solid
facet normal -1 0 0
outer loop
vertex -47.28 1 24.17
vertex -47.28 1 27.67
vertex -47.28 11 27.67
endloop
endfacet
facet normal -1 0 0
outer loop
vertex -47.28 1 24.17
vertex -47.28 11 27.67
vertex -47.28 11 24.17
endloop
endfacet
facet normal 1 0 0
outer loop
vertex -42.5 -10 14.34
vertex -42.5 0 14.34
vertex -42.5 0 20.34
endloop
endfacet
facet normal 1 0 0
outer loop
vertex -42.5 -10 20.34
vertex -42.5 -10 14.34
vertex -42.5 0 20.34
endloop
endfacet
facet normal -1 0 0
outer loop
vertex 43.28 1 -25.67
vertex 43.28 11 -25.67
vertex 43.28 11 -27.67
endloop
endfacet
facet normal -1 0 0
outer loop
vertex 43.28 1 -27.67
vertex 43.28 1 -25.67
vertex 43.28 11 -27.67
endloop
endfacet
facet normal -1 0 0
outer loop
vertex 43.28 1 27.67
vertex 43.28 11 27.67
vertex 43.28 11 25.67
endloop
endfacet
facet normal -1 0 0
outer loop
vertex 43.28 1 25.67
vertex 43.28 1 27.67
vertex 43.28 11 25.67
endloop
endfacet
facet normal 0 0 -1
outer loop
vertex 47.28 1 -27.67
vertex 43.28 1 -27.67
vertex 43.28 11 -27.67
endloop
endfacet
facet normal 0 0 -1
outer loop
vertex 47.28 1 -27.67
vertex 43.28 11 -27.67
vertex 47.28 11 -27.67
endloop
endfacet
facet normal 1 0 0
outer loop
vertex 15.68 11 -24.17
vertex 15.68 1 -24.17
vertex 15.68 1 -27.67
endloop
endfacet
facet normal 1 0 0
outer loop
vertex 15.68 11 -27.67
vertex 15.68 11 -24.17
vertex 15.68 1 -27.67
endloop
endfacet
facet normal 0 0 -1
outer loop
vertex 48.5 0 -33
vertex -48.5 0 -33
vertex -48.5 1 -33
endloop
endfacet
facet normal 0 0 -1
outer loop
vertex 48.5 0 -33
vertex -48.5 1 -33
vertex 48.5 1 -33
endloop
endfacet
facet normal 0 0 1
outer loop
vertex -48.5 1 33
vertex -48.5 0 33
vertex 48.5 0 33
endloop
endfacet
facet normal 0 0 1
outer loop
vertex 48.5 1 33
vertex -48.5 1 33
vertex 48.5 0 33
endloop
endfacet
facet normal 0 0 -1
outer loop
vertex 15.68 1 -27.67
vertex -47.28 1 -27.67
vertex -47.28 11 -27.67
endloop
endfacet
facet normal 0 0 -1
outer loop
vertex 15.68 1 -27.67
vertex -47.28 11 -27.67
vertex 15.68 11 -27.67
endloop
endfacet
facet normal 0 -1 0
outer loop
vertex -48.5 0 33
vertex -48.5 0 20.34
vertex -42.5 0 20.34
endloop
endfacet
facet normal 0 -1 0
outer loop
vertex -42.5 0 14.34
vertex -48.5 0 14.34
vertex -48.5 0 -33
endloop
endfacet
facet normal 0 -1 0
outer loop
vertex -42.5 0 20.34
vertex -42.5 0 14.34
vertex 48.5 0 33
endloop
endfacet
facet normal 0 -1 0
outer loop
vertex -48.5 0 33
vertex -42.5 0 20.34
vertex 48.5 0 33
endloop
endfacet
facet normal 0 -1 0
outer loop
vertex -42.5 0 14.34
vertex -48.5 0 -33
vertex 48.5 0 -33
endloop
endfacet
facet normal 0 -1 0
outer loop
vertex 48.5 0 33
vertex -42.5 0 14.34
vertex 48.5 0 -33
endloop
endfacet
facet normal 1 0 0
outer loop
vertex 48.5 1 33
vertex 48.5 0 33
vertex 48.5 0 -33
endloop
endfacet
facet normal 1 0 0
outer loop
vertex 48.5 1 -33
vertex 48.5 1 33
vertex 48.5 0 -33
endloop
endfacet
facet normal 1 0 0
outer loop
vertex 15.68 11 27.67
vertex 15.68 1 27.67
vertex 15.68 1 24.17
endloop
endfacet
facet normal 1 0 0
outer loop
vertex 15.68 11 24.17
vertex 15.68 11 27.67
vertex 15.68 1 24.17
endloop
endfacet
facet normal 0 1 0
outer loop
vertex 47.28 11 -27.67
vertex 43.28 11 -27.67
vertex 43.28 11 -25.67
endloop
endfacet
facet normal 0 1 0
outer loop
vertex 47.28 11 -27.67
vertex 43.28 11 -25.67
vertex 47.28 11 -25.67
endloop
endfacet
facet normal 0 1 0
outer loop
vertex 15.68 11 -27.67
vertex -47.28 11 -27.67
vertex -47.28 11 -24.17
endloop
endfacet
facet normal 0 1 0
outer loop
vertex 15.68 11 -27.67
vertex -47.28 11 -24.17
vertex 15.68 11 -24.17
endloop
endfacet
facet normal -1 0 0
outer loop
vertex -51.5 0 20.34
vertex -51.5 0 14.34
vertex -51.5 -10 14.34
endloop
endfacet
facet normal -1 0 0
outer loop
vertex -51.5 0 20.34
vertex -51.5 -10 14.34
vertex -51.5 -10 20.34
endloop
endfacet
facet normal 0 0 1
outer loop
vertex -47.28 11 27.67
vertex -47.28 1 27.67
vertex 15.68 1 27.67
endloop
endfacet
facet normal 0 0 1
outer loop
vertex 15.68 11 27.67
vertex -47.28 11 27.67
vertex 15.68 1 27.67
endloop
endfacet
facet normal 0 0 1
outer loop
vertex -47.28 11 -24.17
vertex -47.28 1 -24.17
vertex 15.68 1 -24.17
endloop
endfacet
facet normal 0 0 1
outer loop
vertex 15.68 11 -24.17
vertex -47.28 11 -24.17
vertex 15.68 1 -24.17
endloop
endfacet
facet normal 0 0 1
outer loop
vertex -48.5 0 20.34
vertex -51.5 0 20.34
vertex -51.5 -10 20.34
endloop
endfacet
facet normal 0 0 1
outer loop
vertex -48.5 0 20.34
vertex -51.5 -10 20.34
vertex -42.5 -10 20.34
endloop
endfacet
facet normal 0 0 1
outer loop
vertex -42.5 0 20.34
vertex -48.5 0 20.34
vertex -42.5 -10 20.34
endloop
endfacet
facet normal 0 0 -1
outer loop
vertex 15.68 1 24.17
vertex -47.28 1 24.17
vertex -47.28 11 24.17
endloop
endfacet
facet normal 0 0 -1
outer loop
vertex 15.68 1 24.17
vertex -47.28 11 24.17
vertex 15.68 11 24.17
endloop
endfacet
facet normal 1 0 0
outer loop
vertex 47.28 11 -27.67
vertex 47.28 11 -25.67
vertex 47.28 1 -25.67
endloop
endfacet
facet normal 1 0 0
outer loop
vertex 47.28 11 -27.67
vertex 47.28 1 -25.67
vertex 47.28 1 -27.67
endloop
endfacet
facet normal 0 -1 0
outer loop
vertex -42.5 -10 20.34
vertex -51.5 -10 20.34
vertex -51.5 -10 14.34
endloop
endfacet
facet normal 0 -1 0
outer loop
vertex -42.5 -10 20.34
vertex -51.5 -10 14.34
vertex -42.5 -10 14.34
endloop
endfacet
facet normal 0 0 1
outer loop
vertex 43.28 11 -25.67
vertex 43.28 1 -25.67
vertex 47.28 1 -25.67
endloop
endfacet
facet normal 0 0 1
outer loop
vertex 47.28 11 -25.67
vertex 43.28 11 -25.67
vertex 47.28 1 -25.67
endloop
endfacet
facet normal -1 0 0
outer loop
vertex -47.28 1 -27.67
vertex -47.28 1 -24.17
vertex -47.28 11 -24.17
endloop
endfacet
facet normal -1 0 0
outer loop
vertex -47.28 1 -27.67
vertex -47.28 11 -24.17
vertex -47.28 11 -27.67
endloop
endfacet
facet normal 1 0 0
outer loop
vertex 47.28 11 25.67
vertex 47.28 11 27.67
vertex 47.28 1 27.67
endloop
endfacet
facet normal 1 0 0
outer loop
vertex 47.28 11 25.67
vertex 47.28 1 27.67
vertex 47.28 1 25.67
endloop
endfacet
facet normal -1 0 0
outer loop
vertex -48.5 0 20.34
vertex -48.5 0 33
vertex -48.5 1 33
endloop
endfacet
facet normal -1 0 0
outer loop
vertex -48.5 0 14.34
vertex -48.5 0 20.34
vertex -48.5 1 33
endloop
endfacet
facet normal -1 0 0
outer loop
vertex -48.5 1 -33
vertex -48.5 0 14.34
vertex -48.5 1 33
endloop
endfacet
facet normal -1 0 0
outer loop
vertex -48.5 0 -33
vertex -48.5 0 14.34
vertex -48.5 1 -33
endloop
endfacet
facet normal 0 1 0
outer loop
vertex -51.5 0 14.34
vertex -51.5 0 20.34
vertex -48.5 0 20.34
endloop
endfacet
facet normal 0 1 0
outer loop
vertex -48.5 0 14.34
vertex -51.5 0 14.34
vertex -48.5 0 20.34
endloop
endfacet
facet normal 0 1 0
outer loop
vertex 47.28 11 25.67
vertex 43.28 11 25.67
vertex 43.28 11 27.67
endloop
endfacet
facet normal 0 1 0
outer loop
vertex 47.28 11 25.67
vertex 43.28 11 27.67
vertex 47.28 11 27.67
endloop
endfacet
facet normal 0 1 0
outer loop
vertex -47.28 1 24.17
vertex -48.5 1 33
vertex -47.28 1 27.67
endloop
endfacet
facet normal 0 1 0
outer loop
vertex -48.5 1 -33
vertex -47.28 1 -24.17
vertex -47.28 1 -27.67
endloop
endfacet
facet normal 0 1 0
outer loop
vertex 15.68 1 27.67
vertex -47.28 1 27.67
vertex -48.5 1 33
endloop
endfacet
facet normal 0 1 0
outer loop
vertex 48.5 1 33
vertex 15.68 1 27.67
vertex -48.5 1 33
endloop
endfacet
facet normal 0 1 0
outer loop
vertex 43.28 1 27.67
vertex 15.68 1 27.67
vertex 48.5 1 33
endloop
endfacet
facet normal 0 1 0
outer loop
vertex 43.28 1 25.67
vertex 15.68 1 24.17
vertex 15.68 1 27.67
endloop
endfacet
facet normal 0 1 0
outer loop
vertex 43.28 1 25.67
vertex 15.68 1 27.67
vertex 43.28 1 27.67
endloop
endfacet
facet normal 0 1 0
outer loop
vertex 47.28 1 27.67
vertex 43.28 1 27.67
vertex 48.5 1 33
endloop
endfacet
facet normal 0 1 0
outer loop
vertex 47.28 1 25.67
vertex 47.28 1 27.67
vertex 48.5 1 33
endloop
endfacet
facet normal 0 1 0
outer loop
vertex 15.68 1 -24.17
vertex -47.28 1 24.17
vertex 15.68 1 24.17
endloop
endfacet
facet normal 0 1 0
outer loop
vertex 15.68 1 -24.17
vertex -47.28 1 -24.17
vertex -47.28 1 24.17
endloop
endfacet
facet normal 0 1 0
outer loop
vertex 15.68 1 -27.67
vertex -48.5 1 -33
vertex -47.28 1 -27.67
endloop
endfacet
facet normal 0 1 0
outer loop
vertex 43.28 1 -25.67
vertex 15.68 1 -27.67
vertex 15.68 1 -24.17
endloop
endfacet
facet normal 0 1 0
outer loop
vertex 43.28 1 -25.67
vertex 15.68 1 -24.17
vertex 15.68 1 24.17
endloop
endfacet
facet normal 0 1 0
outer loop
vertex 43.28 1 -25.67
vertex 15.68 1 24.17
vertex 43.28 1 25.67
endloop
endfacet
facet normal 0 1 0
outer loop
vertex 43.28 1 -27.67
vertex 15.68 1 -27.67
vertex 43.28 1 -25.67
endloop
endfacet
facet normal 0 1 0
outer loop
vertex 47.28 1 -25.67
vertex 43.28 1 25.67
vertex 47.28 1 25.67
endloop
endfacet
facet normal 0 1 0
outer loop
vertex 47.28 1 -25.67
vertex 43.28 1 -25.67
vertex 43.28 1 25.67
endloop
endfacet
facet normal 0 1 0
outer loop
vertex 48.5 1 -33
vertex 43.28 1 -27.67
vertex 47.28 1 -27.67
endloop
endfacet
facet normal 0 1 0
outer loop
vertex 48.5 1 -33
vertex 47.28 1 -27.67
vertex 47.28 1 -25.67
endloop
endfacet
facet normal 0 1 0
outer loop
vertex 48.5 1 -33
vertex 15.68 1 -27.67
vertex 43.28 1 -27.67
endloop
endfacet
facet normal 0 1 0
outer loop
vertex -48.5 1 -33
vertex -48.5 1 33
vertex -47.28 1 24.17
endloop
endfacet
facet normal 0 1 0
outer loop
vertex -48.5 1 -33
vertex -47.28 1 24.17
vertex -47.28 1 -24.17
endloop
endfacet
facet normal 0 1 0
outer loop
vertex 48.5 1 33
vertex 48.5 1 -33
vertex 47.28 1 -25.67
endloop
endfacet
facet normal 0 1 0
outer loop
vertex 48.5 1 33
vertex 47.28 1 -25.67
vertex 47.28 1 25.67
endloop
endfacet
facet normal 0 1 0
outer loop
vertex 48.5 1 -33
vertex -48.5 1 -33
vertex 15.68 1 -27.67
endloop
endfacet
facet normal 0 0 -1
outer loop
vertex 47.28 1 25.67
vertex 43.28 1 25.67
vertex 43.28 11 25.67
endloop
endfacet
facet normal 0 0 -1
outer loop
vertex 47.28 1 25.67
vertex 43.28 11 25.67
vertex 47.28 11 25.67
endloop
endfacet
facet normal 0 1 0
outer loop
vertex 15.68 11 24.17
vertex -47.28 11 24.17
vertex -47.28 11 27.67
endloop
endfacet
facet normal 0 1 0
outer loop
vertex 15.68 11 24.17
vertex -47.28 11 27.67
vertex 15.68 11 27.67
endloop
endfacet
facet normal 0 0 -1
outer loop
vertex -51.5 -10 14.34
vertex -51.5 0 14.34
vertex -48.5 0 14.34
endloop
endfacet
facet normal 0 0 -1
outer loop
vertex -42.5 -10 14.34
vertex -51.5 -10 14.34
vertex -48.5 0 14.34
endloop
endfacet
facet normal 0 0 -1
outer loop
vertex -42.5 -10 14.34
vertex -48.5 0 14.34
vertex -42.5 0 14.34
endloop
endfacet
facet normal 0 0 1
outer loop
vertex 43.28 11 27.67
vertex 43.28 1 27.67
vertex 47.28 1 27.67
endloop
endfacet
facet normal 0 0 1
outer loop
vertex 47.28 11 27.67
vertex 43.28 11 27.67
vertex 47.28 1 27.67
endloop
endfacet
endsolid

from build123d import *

# Parameters (mm, degrees)
SKETCH2_W           = 97
SKETCH2_H           = 66
BOSS_EXTRUDE2_DEPTH = 1
SKETCH3_W           = 62.96
SKETCH3_H           = 3.5
BOSS_EXTRUDE3_DEPTH = 10
SKETCH4_W           = 9
SKETCH4_H           = 6
BOSS_EXTRUDE4_DEPTH = 10
SKETCH5_W           = 4
SKETCH5_H           = 2
BOSS_EXTRUDE5_DEPTH = 10


with BuildPart() as part:
    # Sketch2 → Boss-Extrude2 (new body)
    with BuildSketch(Plane(origin=(0, 0, 0), x_dir=(1, 0, 0), z_dir=(0, 1, 0))):
        Rectangle(SKETCH2_W, SKETCH2_H)
    extrude(amount=BOSS_EXTRUDE2_DEPTH)

    # Sketch3 → Boss-Extrude3 (add)
    with BuildSketch(Plane(origin=(0, 1, 0), x_dir=(1, 0, 0), z_dir=(0, 1, 0))):
        with Locations((-15.8, 25.92)):
            Rectangle(SKETCH3_W, SKETCH3_H)
        with Locations((-15.8, -25.92)):
            Rectangle(SKETCH3_W, SKETCH3_H)
    extrude(amount=BOSS_EXTRUDE3_DEPTH)

    # Sketch4 → Boss-Extrude4 (add)
    with BuildSketch(Plane.XZ):
        with Locations((-47, 17.34)):
            Rectangle(SKETCH4_W, SKETCH4_H)
    extrude(amount=BOSS_EXTRUDE4_DEPTH)

    # Sketch5 → Boss-Extrude5 (add)
    with BuildSketch(Plane(origin=(0, 1, 0), x_dir=(1, 0, 0), z_dir=(0, 1, 0))):
        with Locations((45.28, 26.67)):
            Rectangle(SKETCH5_W, SKETCH5_H)
        with Locations((45.28, -26.67)):
            Rectangle(SKETCH5_W, SKETCH5_H)
    extrude(amount=BOSS_EXTRUDE5_DEPTH)


solid = part.part
